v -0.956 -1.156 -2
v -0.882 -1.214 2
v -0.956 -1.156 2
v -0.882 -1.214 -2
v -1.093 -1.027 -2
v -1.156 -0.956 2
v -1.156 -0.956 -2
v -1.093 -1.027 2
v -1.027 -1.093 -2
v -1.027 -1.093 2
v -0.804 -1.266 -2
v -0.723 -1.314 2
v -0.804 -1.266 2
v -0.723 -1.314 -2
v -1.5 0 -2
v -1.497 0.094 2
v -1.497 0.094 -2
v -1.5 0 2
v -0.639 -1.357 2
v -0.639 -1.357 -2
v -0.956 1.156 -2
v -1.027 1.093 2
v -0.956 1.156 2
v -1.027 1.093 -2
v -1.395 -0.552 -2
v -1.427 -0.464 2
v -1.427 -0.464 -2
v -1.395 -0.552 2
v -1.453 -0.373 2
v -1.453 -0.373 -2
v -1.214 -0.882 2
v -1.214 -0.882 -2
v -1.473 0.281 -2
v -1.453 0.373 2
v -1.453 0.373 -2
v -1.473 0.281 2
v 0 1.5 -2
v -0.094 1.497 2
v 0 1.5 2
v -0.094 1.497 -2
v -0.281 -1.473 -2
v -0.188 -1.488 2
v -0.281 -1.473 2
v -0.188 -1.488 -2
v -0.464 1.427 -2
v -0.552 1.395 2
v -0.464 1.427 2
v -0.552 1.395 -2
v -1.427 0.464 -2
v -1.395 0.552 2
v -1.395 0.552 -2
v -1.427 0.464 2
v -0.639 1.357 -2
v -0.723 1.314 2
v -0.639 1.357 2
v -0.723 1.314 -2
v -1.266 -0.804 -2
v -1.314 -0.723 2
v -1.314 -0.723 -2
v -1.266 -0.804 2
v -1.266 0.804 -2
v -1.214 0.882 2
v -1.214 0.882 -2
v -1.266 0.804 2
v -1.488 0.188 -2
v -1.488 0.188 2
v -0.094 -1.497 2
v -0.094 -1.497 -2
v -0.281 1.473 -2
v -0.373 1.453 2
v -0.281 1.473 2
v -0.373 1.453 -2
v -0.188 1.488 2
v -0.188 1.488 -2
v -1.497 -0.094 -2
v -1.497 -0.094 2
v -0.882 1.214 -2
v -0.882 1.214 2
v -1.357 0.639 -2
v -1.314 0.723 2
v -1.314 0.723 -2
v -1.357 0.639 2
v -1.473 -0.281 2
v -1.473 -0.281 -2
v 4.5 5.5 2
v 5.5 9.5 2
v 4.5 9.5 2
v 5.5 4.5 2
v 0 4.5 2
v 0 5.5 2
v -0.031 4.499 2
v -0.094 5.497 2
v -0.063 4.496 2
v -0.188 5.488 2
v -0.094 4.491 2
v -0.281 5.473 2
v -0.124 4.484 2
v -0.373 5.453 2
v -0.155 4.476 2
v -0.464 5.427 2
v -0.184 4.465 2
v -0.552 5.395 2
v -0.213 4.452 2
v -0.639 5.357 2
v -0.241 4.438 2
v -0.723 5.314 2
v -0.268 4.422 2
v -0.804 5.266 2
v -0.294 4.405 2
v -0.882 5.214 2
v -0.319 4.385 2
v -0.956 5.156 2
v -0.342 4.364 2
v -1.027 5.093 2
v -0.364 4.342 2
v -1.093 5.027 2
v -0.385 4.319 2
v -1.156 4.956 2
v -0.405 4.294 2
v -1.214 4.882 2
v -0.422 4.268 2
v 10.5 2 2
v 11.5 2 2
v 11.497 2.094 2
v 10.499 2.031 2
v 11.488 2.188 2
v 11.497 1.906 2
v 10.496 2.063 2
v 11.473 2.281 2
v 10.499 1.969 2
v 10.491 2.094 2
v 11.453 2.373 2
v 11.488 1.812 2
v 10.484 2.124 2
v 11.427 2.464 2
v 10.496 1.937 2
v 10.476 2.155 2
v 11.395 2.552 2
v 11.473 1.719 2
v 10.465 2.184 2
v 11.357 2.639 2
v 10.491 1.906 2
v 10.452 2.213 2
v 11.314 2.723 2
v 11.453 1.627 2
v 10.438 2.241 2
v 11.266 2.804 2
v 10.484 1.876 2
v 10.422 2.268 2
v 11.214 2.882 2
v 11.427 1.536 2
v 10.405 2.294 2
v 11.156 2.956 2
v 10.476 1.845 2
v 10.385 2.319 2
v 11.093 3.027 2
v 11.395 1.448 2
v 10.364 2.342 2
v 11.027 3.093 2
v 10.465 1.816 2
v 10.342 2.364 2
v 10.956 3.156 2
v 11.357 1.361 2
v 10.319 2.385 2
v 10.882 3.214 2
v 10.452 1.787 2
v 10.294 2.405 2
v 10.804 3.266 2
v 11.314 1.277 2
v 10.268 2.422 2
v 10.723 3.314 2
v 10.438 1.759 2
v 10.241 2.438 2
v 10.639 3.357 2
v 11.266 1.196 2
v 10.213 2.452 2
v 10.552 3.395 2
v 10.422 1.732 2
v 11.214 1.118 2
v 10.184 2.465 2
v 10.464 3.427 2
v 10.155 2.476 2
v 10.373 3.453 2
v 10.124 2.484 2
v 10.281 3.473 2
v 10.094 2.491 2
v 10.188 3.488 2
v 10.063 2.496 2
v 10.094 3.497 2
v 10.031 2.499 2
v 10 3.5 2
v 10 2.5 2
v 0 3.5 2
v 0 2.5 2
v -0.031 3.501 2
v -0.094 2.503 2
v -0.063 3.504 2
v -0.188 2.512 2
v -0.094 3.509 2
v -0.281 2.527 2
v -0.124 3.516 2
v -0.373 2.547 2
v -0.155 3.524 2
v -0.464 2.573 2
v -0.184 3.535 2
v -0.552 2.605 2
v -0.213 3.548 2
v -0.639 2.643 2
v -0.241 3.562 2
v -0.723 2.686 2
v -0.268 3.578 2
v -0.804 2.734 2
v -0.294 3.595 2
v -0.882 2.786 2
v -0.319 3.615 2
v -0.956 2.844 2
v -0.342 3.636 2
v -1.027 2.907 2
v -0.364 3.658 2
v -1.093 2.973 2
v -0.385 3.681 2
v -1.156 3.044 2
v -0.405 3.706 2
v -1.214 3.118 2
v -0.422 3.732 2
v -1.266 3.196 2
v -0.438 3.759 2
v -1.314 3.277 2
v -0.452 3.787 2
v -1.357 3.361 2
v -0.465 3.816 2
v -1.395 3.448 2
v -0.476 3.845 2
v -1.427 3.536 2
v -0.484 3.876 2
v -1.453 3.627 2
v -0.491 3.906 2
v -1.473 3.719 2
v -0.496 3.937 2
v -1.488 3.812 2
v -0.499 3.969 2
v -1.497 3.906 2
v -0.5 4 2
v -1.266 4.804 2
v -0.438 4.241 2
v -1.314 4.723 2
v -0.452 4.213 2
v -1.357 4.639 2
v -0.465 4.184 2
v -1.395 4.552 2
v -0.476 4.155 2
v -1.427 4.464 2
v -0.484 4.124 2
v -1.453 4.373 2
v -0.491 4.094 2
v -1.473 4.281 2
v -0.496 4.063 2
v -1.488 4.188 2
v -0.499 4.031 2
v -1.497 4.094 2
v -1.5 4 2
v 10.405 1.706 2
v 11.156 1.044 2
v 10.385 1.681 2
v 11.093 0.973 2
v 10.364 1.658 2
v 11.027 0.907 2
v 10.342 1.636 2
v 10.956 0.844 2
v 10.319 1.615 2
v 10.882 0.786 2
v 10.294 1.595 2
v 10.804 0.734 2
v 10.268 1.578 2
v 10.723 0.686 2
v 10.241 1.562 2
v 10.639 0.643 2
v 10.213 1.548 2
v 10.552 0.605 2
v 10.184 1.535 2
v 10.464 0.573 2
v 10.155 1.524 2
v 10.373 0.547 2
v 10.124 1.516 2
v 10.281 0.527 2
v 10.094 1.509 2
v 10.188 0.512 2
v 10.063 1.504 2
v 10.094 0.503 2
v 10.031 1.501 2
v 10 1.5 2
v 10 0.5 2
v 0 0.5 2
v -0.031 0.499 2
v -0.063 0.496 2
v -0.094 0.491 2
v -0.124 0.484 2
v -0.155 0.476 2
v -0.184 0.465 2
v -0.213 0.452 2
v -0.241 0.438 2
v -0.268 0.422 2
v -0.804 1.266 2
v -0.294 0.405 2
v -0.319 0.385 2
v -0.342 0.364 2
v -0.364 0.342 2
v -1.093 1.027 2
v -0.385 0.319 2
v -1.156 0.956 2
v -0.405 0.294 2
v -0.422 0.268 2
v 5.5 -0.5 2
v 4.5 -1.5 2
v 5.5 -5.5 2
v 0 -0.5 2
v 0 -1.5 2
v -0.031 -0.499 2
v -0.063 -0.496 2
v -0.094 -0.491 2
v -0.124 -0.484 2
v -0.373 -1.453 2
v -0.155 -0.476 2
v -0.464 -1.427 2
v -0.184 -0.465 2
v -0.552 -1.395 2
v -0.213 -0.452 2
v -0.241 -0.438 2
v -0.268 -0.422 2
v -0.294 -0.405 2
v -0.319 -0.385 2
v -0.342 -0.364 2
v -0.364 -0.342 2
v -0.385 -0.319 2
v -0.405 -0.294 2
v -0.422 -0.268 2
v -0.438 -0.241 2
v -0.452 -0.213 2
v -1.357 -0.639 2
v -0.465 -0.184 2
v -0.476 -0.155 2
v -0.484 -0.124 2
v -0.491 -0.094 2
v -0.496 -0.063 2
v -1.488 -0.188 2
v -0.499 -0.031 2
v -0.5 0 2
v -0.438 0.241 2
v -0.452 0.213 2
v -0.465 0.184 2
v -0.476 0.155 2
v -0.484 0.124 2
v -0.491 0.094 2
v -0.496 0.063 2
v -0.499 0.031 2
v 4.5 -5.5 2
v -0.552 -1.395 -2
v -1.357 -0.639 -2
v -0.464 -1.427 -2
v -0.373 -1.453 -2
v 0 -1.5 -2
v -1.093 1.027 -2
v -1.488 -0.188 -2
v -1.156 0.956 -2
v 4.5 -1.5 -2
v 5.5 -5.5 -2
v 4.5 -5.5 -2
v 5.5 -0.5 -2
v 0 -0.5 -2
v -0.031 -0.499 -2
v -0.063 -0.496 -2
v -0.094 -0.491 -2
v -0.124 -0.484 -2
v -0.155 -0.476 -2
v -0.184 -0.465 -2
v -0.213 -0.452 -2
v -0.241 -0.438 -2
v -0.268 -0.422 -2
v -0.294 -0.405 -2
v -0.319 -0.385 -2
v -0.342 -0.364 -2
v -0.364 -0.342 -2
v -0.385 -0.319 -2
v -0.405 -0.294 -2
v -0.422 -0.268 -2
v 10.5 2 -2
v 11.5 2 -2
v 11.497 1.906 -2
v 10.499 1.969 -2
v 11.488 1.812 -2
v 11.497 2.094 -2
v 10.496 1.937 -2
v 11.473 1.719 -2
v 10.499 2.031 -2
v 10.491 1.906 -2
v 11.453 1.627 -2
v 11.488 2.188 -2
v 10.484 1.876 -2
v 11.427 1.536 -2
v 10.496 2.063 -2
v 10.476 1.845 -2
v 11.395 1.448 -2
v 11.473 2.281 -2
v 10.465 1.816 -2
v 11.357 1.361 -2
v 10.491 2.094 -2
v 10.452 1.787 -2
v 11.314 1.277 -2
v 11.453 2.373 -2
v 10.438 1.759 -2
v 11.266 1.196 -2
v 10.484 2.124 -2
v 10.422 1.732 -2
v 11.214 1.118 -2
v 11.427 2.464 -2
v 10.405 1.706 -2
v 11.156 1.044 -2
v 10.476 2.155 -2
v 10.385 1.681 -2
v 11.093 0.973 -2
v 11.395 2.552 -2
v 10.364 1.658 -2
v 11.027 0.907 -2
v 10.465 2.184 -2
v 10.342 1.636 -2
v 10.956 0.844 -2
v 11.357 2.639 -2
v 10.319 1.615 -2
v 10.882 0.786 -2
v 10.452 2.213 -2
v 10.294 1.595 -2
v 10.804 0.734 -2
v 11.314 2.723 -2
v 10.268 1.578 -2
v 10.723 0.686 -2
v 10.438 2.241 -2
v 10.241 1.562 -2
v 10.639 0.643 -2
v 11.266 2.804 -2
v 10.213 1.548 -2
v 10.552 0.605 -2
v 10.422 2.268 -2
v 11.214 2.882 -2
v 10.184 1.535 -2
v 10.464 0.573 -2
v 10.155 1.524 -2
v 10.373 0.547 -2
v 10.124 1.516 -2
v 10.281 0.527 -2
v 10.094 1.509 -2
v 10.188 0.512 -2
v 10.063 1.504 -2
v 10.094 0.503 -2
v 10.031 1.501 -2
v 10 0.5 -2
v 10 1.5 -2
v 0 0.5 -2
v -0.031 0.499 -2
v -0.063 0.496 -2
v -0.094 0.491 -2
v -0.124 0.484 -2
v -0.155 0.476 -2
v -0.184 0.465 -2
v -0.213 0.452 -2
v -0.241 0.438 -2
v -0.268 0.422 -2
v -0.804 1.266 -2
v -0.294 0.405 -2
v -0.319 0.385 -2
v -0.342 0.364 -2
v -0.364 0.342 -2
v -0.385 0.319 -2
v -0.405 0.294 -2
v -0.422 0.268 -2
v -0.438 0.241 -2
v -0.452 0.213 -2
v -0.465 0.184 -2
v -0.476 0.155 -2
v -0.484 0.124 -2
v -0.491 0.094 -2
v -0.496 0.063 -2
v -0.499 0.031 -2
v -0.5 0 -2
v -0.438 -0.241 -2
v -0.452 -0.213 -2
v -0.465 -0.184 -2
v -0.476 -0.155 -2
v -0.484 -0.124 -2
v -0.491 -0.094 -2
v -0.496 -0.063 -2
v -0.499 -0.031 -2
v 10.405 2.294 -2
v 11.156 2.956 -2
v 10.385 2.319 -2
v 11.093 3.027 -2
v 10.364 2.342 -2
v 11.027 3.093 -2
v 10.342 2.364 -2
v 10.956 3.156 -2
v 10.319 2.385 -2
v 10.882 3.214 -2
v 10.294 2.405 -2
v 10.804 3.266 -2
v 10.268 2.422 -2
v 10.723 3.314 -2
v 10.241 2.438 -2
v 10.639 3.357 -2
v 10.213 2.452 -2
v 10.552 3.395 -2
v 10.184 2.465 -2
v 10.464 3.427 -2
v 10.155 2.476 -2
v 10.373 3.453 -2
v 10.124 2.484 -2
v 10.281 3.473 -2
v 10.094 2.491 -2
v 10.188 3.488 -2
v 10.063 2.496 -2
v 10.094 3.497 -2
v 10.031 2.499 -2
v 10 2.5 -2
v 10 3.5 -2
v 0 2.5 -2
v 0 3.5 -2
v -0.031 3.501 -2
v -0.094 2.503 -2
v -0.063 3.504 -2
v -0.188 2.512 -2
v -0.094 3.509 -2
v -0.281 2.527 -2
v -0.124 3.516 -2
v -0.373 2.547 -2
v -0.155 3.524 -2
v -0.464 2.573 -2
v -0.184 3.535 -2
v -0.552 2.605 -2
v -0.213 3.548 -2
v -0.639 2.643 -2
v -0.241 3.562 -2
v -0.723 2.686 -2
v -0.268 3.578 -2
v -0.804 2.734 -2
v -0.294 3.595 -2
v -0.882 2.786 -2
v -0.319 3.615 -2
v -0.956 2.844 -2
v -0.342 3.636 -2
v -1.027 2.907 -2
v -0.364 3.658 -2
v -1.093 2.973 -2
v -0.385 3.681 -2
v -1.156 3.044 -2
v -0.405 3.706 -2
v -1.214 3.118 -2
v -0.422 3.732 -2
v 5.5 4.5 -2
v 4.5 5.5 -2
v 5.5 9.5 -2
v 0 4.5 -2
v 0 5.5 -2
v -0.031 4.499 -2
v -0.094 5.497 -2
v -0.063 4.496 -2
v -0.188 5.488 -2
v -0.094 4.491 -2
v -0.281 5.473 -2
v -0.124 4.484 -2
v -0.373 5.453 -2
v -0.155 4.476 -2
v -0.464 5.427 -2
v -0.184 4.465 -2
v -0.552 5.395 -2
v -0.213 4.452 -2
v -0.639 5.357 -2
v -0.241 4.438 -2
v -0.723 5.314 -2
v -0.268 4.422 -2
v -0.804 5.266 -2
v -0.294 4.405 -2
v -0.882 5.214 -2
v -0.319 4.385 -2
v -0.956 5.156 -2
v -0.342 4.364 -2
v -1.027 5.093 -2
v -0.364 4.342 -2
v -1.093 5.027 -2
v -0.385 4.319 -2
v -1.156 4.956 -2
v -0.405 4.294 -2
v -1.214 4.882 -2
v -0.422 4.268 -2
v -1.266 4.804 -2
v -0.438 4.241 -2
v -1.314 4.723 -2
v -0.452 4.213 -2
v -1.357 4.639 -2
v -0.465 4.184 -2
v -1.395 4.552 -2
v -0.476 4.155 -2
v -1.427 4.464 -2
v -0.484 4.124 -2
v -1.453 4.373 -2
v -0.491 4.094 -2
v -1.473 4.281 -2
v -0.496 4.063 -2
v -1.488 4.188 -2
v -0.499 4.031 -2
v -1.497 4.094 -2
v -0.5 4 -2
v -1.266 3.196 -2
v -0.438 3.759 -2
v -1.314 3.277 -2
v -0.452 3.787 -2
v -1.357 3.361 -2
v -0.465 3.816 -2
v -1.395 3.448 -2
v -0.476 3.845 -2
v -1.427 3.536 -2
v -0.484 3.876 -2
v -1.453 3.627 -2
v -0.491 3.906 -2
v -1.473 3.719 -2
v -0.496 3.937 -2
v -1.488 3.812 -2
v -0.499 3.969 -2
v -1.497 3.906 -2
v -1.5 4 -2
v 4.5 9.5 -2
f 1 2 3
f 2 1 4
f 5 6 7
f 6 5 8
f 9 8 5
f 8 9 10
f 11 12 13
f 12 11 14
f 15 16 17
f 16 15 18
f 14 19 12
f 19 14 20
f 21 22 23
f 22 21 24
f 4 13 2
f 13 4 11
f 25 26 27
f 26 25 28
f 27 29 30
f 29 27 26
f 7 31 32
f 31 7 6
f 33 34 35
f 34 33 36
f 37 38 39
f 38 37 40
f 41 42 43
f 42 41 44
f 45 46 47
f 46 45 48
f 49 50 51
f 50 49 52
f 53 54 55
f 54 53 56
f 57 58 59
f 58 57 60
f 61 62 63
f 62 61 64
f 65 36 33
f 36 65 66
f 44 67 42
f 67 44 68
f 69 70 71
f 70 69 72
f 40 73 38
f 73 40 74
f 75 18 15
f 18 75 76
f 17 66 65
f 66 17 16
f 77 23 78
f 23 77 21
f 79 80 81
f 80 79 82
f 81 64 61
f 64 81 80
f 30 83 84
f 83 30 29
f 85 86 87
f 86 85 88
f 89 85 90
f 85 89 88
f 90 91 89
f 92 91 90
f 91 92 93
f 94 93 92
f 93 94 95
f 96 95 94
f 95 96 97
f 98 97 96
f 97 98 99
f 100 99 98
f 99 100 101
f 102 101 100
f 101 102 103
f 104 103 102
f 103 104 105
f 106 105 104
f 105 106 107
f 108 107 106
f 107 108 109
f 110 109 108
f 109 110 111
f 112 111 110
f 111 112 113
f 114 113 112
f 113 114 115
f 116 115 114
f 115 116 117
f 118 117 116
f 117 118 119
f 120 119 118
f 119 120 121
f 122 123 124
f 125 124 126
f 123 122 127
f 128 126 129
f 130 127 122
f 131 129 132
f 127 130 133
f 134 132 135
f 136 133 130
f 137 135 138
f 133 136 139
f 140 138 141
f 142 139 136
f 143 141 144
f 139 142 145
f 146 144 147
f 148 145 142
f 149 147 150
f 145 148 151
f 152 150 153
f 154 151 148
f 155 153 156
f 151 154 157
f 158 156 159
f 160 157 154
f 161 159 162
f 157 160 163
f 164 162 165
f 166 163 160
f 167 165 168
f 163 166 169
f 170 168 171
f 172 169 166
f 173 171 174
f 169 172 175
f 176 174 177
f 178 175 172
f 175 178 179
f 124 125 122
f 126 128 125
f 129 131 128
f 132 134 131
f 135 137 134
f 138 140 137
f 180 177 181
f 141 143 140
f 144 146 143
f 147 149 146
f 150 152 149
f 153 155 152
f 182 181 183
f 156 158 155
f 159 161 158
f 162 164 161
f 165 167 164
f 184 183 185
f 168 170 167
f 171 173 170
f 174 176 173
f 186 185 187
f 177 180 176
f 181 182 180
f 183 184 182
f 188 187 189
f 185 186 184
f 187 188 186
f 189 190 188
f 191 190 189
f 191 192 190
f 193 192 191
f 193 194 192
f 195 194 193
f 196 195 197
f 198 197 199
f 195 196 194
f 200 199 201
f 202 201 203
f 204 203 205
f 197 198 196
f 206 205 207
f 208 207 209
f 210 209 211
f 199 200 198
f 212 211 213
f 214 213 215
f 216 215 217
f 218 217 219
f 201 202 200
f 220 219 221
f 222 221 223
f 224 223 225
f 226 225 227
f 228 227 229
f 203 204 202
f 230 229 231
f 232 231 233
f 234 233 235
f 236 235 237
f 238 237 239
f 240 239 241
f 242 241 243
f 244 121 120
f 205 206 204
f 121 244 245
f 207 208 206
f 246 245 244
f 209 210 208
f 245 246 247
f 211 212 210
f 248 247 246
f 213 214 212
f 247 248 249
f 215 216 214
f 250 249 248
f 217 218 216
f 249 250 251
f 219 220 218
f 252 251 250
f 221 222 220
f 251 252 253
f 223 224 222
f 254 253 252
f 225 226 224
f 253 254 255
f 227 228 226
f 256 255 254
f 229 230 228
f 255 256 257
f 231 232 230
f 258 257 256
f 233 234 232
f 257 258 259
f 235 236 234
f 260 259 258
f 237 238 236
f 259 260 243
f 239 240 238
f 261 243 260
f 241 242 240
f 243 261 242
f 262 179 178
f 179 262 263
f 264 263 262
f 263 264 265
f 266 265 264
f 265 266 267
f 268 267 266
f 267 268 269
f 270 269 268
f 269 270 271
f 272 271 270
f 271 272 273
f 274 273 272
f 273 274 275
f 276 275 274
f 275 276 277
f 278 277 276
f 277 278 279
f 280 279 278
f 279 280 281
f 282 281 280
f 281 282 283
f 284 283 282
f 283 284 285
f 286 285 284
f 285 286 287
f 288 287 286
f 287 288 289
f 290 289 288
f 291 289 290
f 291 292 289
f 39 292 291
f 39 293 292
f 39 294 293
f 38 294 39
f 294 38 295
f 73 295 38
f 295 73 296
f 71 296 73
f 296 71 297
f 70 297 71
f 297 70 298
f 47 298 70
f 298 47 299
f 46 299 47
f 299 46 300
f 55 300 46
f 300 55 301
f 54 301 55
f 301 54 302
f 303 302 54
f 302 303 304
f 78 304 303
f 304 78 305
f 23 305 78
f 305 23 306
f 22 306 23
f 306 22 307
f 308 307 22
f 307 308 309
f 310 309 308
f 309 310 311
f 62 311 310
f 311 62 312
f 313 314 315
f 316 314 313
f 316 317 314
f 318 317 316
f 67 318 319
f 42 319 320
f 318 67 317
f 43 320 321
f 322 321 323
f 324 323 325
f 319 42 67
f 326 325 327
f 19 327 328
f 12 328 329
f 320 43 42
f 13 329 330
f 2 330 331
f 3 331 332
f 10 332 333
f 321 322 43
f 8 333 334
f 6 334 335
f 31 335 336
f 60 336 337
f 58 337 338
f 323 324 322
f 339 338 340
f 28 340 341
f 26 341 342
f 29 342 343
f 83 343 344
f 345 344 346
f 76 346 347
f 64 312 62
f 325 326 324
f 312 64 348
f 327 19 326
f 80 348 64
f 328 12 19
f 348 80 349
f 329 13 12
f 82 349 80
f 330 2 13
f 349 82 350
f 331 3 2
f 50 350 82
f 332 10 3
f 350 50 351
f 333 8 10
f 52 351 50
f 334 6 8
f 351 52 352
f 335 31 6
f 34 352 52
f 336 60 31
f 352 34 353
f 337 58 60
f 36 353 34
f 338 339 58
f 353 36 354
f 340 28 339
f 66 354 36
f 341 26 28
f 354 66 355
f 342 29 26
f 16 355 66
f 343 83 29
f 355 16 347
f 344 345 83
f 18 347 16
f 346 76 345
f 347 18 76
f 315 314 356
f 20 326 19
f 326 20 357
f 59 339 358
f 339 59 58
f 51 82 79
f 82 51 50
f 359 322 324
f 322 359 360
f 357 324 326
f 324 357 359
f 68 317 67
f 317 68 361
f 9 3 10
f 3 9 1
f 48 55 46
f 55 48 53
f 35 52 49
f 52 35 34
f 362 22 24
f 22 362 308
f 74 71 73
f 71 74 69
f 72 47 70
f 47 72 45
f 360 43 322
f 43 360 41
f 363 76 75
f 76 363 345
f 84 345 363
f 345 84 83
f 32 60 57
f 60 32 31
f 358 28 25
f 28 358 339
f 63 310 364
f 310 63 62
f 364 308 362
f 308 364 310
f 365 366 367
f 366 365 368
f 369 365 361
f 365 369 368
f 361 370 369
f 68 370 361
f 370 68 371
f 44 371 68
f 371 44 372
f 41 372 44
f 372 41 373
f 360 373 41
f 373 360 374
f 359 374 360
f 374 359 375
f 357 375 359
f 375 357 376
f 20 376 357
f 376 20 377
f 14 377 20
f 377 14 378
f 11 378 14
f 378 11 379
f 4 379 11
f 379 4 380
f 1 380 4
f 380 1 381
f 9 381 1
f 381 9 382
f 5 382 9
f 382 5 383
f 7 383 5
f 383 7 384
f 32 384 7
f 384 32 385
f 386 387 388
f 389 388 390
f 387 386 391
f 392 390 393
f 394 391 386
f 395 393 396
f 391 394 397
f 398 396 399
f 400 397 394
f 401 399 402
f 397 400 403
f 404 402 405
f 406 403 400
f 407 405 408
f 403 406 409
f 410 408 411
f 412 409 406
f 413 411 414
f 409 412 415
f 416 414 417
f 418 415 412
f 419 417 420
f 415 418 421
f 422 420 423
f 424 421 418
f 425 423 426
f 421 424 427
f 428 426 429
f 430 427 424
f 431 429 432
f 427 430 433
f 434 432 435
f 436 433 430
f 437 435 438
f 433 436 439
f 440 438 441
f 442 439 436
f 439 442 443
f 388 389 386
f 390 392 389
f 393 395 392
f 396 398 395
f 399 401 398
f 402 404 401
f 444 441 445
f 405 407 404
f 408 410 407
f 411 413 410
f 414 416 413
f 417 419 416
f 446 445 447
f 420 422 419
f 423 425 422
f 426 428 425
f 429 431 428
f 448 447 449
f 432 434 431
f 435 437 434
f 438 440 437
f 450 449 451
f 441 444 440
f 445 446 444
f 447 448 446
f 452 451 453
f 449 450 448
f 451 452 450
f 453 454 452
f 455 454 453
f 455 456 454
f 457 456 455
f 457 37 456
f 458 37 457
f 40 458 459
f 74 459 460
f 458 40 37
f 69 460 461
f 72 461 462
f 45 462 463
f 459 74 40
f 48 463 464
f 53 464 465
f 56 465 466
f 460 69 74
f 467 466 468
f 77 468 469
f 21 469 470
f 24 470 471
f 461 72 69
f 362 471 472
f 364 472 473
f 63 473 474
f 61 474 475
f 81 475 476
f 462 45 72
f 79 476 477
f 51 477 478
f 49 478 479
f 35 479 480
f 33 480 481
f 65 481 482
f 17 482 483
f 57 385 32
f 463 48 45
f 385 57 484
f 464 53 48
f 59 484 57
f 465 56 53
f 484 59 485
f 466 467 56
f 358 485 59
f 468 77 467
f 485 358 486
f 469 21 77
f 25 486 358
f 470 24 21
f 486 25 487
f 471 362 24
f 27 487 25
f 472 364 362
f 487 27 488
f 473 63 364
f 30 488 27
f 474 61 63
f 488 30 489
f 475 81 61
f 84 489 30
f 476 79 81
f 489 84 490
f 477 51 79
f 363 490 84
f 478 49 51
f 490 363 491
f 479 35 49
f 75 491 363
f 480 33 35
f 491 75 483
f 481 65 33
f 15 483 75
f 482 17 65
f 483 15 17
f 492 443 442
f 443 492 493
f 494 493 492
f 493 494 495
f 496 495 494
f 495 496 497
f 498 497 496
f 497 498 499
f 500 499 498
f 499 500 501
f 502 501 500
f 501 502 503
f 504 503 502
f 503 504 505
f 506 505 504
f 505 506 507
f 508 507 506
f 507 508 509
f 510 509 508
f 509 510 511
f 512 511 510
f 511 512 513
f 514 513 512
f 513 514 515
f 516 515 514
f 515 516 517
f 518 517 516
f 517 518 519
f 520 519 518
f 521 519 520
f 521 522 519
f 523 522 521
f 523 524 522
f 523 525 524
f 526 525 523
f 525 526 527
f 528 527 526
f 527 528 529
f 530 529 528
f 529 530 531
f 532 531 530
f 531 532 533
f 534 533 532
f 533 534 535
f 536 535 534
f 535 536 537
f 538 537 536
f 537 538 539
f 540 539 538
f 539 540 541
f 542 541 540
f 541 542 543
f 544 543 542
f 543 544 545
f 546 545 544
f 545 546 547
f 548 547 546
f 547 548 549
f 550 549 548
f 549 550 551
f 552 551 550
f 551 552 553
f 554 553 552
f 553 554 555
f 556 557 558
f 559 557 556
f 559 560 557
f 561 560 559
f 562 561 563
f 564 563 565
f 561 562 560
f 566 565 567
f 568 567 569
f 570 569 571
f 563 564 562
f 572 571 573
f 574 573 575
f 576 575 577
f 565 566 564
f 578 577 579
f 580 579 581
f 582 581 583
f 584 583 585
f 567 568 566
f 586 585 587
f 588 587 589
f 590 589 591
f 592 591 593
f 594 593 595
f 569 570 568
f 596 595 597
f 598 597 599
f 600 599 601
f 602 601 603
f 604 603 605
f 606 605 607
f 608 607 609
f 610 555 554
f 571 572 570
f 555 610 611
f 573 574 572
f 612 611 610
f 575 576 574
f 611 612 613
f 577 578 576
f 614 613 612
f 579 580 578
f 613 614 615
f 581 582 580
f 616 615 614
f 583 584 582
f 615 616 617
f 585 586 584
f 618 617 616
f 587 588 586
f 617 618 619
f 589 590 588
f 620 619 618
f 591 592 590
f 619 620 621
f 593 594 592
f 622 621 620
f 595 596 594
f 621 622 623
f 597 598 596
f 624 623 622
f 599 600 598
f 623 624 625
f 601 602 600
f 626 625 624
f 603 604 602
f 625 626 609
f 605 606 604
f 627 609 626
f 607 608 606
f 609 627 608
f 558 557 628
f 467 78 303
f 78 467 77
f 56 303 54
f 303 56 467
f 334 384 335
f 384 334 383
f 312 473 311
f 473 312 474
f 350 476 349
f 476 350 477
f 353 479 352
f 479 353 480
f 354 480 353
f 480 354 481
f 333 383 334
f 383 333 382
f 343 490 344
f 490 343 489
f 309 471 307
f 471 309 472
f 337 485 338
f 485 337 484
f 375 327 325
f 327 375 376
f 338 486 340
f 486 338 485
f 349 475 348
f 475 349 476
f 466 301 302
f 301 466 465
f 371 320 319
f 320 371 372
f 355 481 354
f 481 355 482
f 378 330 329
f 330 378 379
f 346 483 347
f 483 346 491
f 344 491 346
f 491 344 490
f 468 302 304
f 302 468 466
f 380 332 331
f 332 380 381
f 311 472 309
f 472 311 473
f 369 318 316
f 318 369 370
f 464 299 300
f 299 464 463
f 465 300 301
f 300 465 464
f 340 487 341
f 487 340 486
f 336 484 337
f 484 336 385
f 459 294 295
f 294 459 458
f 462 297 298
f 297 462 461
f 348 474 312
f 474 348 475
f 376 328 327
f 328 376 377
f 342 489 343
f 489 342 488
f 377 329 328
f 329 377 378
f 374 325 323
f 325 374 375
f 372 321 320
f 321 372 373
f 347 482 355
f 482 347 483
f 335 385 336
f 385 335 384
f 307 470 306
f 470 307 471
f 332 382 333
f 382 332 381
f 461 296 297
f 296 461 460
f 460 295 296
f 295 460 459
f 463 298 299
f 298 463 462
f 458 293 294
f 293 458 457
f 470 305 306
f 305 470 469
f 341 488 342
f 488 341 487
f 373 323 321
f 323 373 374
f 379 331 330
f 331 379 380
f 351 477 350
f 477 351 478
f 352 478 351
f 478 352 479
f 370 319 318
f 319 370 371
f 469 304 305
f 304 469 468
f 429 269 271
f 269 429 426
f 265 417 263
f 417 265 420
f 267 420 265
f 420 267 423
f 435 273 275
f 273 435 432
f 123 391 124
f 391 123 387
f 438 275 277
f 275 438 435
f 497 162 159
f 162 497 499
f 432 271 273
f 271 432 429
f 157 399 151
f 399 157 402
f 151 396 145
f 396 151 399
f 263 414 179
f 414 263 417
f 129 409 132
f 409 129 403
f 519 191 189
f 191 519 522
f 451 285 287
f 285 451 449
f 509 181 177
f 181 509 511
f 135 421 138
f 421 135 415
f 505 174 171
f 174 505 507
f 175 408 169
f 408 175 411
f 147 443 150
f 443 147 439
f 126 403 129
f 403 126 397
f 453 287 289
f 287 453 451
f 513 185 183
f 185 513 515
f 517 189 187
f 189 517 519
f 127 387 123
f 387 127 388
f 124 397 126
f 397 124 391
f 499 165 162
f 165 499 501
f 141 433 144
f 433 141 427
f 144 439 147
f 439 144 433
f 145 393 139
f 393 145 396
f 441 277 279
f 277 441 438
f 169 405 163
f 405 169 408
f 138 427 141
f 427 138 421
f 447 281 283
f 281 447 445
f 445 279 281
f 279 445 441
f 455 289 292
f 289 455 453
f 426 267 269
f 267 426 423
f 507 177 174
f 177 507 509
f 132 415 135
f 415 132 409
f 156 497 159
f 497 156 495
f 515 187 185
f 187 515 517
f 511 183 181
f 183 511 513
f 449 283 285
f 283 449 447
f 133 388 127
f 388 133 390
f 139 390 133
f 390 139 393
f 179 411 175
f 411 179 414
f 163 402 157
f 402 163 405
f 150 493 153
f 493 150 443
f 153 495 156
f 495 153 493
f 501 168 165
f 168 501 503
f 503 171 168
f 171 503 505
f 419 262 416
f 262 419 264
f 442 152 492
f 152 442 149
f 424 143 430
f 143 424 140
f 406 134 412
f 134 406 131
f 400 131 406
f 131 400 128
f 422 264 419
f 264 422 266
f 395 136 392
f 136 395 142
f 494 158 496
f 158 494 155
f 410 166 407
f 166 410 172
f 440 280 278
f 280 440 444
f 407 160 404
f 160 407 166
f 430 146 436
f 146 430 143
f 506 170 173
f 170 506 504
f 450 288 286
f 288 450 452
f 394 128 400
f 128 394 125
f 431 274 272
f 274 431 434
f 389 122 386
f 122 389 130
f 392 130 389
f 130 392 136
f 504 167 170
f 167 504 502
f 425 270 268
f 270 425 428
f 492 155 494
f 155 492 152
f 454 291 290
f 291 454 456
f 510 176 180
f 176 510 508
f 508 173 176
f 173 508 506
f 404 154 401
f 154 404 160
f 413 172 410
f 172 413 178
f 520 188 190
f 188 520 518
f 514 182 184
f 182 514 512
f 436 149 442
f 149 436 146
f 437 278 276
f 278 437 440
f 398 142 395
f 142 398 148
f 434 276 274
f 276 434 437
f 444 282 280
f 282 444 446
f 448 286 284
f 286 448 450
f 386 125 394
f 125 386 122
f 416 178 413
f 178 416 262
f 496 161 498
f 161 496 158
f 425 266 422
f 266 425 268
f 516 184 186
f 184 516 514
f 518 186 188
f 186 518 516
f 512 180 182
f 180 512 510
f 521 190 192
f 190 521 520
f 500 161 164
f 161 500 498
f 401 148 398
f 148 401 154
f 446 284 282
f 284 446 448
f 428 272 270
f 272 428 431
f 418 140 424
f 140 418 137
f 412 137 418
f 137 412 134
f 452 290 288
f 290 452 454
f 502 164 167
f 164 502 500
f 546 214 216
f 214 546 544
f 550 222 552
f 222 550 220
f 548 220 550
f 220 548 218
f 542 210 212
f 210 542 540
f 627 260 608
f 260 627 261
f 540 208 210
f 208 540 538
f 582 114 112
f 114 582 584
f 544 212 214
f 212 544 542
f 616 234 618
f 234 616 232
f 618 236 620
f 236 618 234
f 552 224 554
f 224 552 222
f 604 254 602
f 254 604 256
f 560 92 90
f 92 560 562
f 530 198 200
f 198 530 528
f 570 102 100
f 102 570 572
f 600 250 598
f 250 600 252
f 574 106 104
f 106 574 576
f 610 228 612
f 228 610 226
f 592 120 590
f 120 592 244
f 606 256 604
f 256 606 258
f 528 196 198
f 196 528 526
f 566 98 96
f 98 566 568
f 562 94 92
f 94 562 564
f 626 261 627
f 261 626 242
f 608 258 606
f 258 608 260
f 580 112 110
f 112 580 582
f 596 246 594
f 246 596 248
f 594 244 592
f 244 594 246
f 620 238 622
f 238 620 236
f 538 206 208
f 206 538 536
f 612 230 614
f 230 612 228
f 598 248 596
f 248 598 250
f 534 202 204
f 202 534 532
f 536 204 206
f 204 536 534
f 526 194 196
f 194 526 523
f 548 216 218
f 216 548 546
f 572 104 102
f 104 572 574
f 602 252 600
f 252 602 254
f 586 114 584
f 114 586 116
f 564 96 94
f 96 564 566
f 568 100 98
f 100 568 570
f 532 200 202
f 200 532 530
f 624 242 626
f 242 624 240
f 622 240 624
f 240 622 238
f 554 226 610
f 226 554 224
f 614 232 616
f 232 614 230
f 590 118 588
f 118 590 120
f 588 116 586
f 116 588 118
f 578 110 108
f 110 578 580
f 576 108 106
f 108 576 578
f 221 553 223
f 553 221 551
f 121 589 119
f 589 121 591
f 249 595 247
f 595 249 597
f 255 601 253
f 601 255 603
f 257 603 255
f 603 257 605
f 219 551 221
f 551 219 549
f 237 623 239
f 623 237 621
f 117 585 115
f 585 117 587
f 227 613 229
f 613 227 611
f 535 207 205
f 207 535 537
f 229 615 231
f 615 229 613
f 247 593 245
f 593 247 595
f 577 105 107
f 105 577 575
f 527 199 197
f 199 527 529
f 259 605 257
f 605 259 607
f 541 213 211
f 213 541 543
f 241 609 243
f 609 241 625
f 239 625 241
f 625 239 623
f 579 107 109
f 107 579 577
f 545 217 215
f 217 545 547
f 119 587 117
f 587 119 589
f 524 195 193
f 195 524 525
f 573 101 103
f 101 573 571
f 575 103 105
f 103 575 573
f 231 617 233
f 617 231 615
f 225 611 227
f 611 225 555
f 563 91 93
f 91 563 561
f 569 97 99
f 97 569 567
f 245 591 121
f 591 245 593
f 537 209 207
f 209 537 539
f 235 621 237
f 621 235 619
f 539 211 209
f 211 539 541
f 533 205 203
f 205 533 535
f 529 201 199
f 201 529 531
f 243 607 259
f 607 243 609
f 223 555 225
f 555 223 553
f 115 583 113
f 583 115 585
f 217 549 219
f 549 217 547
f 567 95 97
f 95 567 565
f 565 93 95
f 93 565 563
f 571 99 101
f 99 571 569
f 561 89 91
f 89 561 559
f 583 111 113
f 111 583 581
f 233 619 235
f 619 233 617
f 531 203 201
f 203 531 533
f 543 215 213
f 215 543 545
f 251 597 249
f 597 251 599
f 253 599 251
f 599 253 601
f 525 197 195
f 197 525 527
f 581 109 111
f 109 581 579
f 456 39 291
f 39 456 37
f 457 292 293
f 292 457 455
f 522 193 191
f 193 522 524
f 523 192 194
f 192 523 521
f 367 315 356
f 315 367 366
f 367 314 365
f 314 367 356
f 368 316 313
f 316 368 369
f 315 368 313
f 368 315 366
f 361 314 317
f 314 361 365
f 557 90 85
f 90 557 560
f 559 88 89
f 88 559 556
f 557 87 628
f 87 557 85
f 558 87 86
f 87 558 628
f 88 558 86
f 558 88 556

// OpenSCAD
//----------------------------------------------------------------------------
//	Filename:	flat_springV1_3.scad
//	Author:		R.Pritz ( r@pritz.me )
//	Date:		Sunday, 10 Jan 2016
//
// A parametric spring with end mounting stubs.
//----------------------------------------------------------------------------

/* [Basic] */

//width from opposing coil radius
width = 10;
//number of coils
spring_count = 2;
// how tall the spring will be
depth = 4;

/* [Advanced] */

// length of support stub
stub_length = 5;
// radius of turn in each coil
radius = 1;
// width of spring coils 
thickness = 1;

/* [Hidden] */
$fn = 100;

module spring_maker(radius = 5, thickness = 5, depth = 20, width = 40, spring_count = 21, end_len = 30){

    

    union(){
        
        translate([(width/2),-((end_len/2)+(radius/2)),0])
            rotate([0,0,90])
            linear_extrude( depth, center=true )
                square( [end_len, thickness], center=true );
        translate([(width/4),-radius,0])
            linear_extrude( depth, center=true )
                square( [width/2, thickness], center=true );
        arc_maker(radius, thickness, depth);
        
        for (i = [1:spring_count]){
            mod = i%2;
            rotate([0,mod*180,0])
                translate([mod*-width,(radius*2*i),0])
                    arc_maker(radius, thickness, depth);
            translate([width/2,i*(radius*2)-radius,0])
                linear_extrude( depth, center=true )
                    square( [width, thickness], center=true );        
        }
        
        translate([width/4+(spring_count%2*(width/2)),(spring_count+1) *(radius*2)-radius,0])
                linear_extrude( depth, center=true )
                    square( [(width/2), thickness], center=true );
        translate([(width/2),((end_len/2)+(radius/2))+(radius*2*spring_count),0])
            rotate([0,0,90])
            linear_extrude( depth, center=true )
                square( [end_len, thickness], center=true );
    }
}
module arc_maker(radius, thickness, depth){
    difference(){
        linear_extrude( depth, center=true)
            circle( radius+(thickness/2) );
        linear_extrude( depth*1.2, center=true )
            circle( radius-(thickness/2) );
        translate([0,-radius-(thickness/2),0])
            linear_extrude( depth*1.2, center=true )
                square( radius*3 );
    }
}

spring_maker(radius, thickness, depth, width, spring_count, stub_length);
//arc_maker(radius, thickness, depth);
